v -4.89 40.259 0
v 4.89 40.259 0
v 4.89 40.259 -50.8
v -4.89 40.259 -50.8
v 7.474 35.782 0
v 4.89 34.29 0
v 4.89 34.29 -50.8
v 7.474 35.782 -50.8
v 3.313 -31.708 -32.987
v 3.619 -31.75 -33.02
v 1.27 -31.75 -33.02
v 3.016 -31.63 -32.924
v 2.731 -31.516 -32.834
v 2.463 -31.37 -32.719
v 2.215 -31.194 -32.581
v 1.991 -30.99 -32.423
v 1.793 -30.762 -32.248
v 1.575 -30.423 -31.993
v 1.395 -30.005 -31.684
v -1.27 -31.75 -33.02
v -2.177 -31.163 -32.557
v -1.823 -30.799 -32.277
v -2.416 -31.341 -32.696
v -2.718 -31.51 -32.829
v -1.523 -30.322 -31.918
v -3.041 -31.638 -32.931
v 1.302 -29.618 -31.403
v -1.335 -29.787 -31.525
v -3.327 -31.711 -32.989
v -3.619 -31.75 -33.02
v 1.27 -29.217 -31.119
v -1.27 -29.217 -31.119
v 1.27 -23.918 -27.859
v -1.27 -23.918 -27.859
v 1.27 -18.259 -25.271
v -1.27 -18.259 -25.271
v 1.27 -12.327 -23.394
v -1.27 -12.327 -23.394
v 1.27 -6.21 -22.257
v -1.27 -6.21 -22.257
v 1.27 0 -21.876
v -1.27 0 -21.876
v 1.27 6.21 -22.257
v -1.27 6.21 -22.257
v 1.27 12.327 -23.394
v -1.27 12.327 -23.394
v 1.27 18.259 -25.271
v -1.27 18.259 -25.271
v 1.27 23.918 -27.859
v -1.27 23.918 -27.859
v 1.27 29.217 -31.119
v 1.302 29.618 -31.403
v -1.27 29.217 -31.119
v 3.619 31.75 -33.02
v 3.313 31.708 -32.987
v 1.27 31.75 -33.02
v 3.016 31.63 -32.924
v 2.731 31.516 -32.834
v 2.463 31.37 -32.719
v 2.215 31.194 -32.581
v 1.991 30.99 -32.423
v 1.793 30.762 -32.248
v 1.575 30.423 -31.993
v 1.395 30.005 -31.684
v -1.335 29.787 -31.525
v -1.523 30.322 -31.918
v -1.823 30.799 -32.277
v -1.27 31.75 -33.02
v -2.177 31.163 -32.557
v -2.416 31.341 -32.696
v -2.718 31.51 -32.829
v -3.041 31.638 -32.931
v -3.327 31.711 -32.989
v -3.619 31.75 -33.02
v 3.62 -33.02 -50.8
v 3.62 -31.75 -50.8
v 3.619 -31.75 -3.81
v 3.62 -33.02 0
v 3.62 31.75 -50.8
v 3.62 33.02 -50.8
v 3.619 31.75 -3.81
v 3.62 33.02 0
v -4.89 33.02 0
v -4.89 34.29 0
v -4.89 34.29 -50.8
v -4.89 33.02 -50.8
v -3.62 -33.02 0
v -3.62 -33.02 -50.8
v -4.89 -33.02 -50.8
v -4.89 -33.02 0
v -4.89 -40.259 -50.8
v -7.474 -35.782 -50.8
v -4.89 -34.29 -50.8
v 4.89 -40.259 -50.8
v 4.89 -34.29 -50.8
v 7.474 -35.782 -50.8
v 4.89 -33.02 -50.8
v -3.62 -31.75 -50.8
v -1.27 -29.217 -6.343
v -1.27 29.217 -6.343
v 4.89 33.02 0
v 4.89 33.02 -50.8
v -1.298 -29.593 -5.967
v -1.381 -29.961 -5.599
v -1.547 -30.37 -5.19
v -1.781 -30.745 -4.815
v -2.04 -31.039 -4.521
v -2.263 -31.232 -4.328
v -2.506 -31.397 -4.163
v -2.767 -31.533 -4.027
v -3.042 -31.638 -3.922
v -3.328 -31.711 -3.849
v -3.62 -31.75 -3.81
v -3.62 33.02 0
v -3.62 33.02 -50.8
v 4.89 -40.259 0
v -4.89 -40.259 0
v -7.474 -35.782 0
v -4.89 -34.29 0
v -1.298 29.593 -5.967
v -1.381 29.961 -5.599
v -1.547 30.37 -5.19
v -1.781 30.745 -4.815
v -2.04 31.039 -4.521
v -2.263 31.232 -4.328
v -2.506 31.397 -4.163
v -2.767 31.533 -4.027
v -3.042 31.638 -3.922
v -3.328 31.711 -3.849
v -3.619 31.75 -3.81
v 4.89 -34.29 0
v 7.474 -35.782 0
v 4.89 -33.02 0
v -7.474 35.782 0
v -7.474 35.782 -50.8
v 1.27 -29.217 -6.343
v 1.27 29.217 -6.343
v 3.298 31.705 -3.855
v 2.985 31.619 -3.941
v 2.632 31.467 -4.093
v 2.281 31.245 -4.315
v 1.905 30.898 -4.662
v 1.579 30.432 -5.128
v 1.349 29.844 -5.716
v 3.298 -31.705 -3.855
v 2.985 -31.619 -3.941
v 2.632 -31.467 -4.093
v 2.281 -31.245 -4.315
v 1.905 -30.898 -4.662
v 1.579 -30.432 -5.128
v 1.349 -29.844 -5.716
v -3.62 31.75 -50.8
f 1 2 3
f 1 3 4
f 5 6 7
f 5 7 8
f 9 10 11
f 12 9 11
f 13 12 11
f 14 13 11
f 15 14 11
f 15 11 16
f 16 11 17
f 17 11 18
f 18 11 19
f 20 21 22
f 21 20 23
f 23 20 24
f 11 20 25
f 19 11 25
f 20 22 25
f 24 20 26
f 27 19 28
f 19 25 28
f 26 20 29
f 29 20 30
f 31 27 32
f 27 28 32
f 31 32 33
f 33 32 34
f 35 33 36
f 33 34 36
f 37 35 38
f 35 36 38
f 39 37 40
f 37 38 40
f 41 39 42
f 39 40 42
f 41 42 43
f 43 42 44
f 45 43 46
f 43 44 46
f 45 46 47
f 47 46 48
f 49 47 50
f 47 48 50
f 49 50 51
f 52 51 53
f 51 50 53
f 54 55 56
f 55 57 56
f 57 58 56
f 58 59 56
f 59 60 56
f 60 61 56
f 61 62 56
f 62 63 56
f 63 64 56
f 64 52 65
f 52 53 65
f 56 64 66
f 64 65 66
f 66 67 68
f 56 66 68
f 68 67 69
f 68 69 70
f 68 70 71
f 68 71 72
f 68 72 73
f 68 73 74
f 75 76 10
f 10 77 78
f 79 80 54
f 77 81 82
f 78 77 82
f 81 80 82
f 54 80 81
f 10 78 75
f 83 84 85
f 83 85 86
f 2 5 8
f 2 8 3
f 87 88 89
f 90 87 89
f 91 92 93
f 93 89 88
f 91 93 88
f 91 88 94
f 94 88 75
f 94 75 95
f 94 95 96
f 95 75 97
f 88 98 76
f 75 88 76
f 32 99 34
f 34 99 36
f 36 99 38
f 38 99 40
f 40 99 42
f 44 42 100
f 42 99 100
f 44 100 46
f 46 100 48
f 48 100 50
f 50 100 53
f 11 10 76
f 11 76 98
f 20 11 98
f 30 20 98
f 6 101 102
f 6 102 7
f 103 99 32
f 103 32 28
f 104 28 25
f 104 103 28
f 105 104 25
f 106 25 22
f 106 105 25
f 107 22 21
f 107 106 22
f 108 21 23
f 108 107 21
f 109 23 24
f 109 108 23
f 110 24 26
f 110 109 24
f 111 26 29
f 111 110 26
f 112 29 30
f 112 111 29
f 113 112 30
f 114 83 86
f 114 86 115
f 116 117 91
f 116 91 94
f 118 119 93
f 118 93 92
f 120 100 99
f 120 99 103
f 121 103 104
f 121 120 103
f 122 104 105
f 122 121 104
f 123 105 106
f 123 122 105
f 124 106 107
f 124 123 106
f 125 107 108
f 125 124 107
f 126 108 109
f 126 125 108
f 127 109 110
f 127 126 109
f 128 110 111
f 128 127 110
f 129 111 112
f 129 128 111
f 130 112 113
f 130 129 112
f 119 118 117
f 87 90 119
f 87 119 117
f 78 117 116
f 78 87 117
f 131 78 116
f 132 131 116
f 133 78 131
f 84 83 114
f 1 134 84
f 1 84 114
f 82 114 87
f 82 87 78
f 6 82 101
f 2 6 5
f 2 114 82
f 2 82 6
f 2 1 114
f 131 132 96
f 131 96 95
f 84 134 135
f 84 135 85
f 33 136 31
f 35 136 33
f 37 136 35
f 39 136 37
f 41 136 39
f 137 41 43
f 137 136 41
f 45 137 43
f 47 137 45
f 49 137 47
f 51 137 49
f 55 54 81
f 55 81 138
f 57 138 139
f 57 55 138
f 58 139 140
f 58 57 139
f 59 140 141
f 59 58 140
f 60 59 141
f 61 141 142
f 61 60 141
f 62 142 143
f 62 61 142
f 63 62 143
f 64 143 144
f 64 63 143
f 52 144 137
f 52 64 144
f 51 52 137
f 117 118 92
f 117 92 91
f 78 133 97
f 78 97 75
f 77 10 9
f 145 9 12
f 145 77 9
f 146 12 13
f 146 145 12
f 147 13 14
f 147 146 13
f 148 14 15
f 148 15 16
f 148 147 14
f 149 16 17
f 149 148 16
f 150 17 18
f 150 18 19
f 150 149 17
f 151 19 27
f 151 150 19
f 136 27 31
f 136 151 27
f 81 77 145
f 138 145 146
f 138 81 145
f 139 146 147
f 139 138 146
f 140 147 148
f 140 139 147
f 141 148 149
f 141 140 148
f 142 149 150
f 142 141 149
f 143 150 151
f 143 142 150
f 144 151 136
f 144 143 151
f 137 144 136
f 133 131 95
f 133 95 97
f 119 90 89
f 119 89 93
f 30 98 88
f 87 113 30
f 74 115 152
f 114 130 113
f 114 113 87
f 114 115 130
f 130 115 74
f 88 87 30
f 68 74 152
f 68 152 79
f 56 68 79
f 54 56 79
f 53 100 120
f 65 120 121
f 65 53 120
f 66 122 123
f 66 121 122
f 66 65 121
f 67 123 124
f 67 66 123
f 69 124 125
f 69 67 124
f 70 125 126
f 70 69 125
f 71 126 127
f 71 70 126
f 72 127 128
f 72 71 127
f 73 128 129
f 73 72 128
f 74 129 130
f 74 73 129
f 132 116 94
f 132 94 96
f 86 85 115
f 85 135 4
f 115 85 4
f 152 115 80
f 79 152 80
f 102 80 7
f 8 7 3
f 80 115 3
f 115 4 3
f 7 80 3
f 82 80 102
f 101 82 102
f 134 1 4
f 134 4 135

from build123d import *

# Parameters (mm, degrees)
BOSS_EXTRUDE1_DEPTH = 50.8
SKETCH2_W           = 7.239
SKETCH2_H           = 3.81
BOSS_EXTRUDE2_DEPTH = 63.5
RIB1_START          = -1.27
RIB1_DEPTH          = 2.54
FILLET1_R           = 2.54


# Read off the part's stored shape, not the designer's step: Rib1
with BuildPart() as part:
    # Sketch1 → Boss-Extrude1 (new body)
    with BuildSketch(Plane.XY):
        Polygon((3.6195, -31.75), (0, -31.75), (-3.6195, -31.75), (-3.6195, -33.02), (-4.8895, -33.02), (-4.8895, -34.29), (-4.8895, -40.259), (4.8895, -40.259), (4.8895, -34.29), (4.8895, -33.02), (3.6195, -33.02), align=None)
        Polygon((-4.8895, -40.259), (-4.8895, -34.29), (-7.474152818, -35.78225), align=None)
        Polygon((7.474152818, -35.78225), (4.8895, -34.29), (4.8895, -40.259), align=None)
        Polygon((-3.6195, 33.02), (-3.6195, 31.75), (0, 31.75), (3.6195, 31.75), (3.6195, 33.02), (4.8895, 33.02), (4.8895, 34.29), (4.8895, 40.259), (-4.8895, 40.259), (-4.8895, 34.29), (-4.8895, 33.02), align=None)
        Polygon((-7.474152818, 35.78225), (-4.8895, 34.29), (-4.8895, 40.259), align=None)
        Polygon((7.474152818, 35.78225), (4.8895, 40.259), (4.8895, 34.29), align=None)
    extrude(amount=-BOSS_EXTRUDE1_DEPTH)

    # Sketch2 → Boss-Extrude2 (add)
    with BuildSketch(Plane.XZ.offset(-31.75)):
        with Locations((0, -1.905)):
            Rectangle(SKETCH2_W, SKETCH2_H)
    extrude(amount=BOSS_EXTRUDE2_DEPTH)

    # Rib1 outline → Rib1 (add)
    with BuildSketch(Plane(origin=(0, 0, 0), x_dir=(0, 0, -1), z_dir=(1, 0, 0)).offset(RIB1_START)):
        with BuildLine():
            ThreePointArc((33.02, -31.75), (21.87573729, 0), (33.02, 31.75))
            Line((33.02, 31.75), (3.81, 31.75))
            Line((3.81, 31.75), (3.81, -31.75))
            Line((3.81, -31.75), (33.02, -31.75))
        make_face()
    extrude(amount=RIB1_DEPTH)

    # Fillet1
    # the kernel refuses this fillet: 2.54 mm, written as the material it adds along each edge
    with BuildSketch(Plane(origin=(-1.27, 31.75, -39.352115439), x_dir=(-1, 0, 0), z_dir=(0, 0, 1))) as fillet1_piece_1_section:
        with BuildLine():
            CenterArc((2.54, 2.532846176), FILLET1_R, 180, 85.698777695)
            Line((0, 2.532846176), (0, 0))
            Line((0, 0), (2.3495, 0))
        make_face()
    fillet1_piece_1 = extrude(amount=35.542115439, mode=Mode.PRIVATE)
    fillet1_piece_1 = fillet1_piece_1 - Plane(origin=(-1.944090085, 0, -72.675737291), x_dir=(0, -0.6249999999925505, 0.7806247498057642), z_dir=(-1, 0, 0)) * Cylinder(50.800000001, 82, mode=Mode.PRIVATE)
    add(fillet1_piece_1)
    with BuildSketch(Plane(origin=(-1.27, 38.082115439, -3.81), x_dir=(-1, 0, 0), z_dir=(0, -1, 0))) as fillet1_piece_2:
        with BuildLine():
            CenterArc((2.54, 2.532846176), FILLET1_R, 180, 85.698777695)
            Line((0, 2.532846176), (0, 0))
            Line((0, 0), (2.3495, 0))
        make_face()
    extrude(amount=76.164230879)
    with BuildSketch(Plane(origin=(-1.27, -31.75, -3.81), x_dir=(-1, 0, 0), z_dir=(0, 0, -1))) as fillet1_piece_3_section:
        with BuildLine():
            CenterArc((2.54, 2.532846176), FILLET1_R, 180, 85.698777695)
            Line((0, 2.532846176), (0, 0))
            Line((0, 0), (2.3495, 0))
        make_face()
    fillet1_piece_3 = extrude(amount=35.542115439, mode=Mode.PRIVATE)
    fillet1_piece_3 = fillet1_piece_3 - Plane(origin=(-1.944090085, 0, -72.675737291), x_dir=(0, -0.6249999999925505, 0.7806247498057642), z_dir=(-1, 0, 0)) * Cylinder(50.800000001, 82, mode=Mode.PRIVATE)
    add(fillet1_piece_3)
    with BuildSketch(Plane(origin=(1.27, 31.75, -39.352115439), x_dir=(1, 0, 0), z_dir=(0, 0, 1))) as fillet1_piece_4_section:
        with BuildLine():
            CenterArc((2.54, -2.532846176), FILLET1_R, 94.301222305, 85.698777695)
            Line((0, -2.532846176), (0, 0))
            Line((0, 0), (2.3495, 0))
        make_face()
    fillet1_piece_4 = extrude(amount=35.542115439, mode=Mode.PRIVATE)
    fillet1_piece_4 = fillet1_piece_4 - Plane(origin=(1.944090085, 0, -72.675737291), x_dir=(0, -0.6249999999925505, 0.7806247498057642), z_dir=(-1, 0, 0)) * Cylinder(50.800000001, 82, mode=Mode.PRIVATE)
    add(fillet1_piece_4)
    with BuildSketch(Plane(origin=(1.27, -31.75, -3.81), x_dir=(1, 0, 0), z_dir=(0, 0, -1))) as fillet1_piece_5_section:
        with BuildLine():
            CenterArc((2.54, -2.532846176), FILLET1_R, 94.301222305, 85.698777695)
            Line((0, -2.532846176), (0, 0))
            Line((0, 0), (2.3495, 0))
        make_face()
    fillet1_piece_5 = extrude(amount=35.542115439, mode=Mode.PRIVATE)
    fillet1_piece_5 = fillet1_piece_5 - Plane(origin=(1.944090085, 0, -72.675737291), x_dir=(0, -0.6249999999925505, 0.7806247498057642), z_dir=(-1, 0, 0)) * Cylinder(50.800000001, 82, mode=Mode.PRIVATE)
    add(fillet1_piece_5)
    with BuildSketch(Plane(origin=(1.27, 38.082115439, -3.81), x_dir=(0, 0, -1), z_dir=(0, -1, 0))) as fillet1_piece_6:
        with BuildLine():
            CenterArc((2.532846176, 2.54), FILLET1_R, 184.301222305, 85.698777695)
            Line((0, 2.3495), (0, 0))
            Line((0, 0), (2.532846176, 0))
        make_face()
    extrude(amount=76.164230879)


solid = part.part
